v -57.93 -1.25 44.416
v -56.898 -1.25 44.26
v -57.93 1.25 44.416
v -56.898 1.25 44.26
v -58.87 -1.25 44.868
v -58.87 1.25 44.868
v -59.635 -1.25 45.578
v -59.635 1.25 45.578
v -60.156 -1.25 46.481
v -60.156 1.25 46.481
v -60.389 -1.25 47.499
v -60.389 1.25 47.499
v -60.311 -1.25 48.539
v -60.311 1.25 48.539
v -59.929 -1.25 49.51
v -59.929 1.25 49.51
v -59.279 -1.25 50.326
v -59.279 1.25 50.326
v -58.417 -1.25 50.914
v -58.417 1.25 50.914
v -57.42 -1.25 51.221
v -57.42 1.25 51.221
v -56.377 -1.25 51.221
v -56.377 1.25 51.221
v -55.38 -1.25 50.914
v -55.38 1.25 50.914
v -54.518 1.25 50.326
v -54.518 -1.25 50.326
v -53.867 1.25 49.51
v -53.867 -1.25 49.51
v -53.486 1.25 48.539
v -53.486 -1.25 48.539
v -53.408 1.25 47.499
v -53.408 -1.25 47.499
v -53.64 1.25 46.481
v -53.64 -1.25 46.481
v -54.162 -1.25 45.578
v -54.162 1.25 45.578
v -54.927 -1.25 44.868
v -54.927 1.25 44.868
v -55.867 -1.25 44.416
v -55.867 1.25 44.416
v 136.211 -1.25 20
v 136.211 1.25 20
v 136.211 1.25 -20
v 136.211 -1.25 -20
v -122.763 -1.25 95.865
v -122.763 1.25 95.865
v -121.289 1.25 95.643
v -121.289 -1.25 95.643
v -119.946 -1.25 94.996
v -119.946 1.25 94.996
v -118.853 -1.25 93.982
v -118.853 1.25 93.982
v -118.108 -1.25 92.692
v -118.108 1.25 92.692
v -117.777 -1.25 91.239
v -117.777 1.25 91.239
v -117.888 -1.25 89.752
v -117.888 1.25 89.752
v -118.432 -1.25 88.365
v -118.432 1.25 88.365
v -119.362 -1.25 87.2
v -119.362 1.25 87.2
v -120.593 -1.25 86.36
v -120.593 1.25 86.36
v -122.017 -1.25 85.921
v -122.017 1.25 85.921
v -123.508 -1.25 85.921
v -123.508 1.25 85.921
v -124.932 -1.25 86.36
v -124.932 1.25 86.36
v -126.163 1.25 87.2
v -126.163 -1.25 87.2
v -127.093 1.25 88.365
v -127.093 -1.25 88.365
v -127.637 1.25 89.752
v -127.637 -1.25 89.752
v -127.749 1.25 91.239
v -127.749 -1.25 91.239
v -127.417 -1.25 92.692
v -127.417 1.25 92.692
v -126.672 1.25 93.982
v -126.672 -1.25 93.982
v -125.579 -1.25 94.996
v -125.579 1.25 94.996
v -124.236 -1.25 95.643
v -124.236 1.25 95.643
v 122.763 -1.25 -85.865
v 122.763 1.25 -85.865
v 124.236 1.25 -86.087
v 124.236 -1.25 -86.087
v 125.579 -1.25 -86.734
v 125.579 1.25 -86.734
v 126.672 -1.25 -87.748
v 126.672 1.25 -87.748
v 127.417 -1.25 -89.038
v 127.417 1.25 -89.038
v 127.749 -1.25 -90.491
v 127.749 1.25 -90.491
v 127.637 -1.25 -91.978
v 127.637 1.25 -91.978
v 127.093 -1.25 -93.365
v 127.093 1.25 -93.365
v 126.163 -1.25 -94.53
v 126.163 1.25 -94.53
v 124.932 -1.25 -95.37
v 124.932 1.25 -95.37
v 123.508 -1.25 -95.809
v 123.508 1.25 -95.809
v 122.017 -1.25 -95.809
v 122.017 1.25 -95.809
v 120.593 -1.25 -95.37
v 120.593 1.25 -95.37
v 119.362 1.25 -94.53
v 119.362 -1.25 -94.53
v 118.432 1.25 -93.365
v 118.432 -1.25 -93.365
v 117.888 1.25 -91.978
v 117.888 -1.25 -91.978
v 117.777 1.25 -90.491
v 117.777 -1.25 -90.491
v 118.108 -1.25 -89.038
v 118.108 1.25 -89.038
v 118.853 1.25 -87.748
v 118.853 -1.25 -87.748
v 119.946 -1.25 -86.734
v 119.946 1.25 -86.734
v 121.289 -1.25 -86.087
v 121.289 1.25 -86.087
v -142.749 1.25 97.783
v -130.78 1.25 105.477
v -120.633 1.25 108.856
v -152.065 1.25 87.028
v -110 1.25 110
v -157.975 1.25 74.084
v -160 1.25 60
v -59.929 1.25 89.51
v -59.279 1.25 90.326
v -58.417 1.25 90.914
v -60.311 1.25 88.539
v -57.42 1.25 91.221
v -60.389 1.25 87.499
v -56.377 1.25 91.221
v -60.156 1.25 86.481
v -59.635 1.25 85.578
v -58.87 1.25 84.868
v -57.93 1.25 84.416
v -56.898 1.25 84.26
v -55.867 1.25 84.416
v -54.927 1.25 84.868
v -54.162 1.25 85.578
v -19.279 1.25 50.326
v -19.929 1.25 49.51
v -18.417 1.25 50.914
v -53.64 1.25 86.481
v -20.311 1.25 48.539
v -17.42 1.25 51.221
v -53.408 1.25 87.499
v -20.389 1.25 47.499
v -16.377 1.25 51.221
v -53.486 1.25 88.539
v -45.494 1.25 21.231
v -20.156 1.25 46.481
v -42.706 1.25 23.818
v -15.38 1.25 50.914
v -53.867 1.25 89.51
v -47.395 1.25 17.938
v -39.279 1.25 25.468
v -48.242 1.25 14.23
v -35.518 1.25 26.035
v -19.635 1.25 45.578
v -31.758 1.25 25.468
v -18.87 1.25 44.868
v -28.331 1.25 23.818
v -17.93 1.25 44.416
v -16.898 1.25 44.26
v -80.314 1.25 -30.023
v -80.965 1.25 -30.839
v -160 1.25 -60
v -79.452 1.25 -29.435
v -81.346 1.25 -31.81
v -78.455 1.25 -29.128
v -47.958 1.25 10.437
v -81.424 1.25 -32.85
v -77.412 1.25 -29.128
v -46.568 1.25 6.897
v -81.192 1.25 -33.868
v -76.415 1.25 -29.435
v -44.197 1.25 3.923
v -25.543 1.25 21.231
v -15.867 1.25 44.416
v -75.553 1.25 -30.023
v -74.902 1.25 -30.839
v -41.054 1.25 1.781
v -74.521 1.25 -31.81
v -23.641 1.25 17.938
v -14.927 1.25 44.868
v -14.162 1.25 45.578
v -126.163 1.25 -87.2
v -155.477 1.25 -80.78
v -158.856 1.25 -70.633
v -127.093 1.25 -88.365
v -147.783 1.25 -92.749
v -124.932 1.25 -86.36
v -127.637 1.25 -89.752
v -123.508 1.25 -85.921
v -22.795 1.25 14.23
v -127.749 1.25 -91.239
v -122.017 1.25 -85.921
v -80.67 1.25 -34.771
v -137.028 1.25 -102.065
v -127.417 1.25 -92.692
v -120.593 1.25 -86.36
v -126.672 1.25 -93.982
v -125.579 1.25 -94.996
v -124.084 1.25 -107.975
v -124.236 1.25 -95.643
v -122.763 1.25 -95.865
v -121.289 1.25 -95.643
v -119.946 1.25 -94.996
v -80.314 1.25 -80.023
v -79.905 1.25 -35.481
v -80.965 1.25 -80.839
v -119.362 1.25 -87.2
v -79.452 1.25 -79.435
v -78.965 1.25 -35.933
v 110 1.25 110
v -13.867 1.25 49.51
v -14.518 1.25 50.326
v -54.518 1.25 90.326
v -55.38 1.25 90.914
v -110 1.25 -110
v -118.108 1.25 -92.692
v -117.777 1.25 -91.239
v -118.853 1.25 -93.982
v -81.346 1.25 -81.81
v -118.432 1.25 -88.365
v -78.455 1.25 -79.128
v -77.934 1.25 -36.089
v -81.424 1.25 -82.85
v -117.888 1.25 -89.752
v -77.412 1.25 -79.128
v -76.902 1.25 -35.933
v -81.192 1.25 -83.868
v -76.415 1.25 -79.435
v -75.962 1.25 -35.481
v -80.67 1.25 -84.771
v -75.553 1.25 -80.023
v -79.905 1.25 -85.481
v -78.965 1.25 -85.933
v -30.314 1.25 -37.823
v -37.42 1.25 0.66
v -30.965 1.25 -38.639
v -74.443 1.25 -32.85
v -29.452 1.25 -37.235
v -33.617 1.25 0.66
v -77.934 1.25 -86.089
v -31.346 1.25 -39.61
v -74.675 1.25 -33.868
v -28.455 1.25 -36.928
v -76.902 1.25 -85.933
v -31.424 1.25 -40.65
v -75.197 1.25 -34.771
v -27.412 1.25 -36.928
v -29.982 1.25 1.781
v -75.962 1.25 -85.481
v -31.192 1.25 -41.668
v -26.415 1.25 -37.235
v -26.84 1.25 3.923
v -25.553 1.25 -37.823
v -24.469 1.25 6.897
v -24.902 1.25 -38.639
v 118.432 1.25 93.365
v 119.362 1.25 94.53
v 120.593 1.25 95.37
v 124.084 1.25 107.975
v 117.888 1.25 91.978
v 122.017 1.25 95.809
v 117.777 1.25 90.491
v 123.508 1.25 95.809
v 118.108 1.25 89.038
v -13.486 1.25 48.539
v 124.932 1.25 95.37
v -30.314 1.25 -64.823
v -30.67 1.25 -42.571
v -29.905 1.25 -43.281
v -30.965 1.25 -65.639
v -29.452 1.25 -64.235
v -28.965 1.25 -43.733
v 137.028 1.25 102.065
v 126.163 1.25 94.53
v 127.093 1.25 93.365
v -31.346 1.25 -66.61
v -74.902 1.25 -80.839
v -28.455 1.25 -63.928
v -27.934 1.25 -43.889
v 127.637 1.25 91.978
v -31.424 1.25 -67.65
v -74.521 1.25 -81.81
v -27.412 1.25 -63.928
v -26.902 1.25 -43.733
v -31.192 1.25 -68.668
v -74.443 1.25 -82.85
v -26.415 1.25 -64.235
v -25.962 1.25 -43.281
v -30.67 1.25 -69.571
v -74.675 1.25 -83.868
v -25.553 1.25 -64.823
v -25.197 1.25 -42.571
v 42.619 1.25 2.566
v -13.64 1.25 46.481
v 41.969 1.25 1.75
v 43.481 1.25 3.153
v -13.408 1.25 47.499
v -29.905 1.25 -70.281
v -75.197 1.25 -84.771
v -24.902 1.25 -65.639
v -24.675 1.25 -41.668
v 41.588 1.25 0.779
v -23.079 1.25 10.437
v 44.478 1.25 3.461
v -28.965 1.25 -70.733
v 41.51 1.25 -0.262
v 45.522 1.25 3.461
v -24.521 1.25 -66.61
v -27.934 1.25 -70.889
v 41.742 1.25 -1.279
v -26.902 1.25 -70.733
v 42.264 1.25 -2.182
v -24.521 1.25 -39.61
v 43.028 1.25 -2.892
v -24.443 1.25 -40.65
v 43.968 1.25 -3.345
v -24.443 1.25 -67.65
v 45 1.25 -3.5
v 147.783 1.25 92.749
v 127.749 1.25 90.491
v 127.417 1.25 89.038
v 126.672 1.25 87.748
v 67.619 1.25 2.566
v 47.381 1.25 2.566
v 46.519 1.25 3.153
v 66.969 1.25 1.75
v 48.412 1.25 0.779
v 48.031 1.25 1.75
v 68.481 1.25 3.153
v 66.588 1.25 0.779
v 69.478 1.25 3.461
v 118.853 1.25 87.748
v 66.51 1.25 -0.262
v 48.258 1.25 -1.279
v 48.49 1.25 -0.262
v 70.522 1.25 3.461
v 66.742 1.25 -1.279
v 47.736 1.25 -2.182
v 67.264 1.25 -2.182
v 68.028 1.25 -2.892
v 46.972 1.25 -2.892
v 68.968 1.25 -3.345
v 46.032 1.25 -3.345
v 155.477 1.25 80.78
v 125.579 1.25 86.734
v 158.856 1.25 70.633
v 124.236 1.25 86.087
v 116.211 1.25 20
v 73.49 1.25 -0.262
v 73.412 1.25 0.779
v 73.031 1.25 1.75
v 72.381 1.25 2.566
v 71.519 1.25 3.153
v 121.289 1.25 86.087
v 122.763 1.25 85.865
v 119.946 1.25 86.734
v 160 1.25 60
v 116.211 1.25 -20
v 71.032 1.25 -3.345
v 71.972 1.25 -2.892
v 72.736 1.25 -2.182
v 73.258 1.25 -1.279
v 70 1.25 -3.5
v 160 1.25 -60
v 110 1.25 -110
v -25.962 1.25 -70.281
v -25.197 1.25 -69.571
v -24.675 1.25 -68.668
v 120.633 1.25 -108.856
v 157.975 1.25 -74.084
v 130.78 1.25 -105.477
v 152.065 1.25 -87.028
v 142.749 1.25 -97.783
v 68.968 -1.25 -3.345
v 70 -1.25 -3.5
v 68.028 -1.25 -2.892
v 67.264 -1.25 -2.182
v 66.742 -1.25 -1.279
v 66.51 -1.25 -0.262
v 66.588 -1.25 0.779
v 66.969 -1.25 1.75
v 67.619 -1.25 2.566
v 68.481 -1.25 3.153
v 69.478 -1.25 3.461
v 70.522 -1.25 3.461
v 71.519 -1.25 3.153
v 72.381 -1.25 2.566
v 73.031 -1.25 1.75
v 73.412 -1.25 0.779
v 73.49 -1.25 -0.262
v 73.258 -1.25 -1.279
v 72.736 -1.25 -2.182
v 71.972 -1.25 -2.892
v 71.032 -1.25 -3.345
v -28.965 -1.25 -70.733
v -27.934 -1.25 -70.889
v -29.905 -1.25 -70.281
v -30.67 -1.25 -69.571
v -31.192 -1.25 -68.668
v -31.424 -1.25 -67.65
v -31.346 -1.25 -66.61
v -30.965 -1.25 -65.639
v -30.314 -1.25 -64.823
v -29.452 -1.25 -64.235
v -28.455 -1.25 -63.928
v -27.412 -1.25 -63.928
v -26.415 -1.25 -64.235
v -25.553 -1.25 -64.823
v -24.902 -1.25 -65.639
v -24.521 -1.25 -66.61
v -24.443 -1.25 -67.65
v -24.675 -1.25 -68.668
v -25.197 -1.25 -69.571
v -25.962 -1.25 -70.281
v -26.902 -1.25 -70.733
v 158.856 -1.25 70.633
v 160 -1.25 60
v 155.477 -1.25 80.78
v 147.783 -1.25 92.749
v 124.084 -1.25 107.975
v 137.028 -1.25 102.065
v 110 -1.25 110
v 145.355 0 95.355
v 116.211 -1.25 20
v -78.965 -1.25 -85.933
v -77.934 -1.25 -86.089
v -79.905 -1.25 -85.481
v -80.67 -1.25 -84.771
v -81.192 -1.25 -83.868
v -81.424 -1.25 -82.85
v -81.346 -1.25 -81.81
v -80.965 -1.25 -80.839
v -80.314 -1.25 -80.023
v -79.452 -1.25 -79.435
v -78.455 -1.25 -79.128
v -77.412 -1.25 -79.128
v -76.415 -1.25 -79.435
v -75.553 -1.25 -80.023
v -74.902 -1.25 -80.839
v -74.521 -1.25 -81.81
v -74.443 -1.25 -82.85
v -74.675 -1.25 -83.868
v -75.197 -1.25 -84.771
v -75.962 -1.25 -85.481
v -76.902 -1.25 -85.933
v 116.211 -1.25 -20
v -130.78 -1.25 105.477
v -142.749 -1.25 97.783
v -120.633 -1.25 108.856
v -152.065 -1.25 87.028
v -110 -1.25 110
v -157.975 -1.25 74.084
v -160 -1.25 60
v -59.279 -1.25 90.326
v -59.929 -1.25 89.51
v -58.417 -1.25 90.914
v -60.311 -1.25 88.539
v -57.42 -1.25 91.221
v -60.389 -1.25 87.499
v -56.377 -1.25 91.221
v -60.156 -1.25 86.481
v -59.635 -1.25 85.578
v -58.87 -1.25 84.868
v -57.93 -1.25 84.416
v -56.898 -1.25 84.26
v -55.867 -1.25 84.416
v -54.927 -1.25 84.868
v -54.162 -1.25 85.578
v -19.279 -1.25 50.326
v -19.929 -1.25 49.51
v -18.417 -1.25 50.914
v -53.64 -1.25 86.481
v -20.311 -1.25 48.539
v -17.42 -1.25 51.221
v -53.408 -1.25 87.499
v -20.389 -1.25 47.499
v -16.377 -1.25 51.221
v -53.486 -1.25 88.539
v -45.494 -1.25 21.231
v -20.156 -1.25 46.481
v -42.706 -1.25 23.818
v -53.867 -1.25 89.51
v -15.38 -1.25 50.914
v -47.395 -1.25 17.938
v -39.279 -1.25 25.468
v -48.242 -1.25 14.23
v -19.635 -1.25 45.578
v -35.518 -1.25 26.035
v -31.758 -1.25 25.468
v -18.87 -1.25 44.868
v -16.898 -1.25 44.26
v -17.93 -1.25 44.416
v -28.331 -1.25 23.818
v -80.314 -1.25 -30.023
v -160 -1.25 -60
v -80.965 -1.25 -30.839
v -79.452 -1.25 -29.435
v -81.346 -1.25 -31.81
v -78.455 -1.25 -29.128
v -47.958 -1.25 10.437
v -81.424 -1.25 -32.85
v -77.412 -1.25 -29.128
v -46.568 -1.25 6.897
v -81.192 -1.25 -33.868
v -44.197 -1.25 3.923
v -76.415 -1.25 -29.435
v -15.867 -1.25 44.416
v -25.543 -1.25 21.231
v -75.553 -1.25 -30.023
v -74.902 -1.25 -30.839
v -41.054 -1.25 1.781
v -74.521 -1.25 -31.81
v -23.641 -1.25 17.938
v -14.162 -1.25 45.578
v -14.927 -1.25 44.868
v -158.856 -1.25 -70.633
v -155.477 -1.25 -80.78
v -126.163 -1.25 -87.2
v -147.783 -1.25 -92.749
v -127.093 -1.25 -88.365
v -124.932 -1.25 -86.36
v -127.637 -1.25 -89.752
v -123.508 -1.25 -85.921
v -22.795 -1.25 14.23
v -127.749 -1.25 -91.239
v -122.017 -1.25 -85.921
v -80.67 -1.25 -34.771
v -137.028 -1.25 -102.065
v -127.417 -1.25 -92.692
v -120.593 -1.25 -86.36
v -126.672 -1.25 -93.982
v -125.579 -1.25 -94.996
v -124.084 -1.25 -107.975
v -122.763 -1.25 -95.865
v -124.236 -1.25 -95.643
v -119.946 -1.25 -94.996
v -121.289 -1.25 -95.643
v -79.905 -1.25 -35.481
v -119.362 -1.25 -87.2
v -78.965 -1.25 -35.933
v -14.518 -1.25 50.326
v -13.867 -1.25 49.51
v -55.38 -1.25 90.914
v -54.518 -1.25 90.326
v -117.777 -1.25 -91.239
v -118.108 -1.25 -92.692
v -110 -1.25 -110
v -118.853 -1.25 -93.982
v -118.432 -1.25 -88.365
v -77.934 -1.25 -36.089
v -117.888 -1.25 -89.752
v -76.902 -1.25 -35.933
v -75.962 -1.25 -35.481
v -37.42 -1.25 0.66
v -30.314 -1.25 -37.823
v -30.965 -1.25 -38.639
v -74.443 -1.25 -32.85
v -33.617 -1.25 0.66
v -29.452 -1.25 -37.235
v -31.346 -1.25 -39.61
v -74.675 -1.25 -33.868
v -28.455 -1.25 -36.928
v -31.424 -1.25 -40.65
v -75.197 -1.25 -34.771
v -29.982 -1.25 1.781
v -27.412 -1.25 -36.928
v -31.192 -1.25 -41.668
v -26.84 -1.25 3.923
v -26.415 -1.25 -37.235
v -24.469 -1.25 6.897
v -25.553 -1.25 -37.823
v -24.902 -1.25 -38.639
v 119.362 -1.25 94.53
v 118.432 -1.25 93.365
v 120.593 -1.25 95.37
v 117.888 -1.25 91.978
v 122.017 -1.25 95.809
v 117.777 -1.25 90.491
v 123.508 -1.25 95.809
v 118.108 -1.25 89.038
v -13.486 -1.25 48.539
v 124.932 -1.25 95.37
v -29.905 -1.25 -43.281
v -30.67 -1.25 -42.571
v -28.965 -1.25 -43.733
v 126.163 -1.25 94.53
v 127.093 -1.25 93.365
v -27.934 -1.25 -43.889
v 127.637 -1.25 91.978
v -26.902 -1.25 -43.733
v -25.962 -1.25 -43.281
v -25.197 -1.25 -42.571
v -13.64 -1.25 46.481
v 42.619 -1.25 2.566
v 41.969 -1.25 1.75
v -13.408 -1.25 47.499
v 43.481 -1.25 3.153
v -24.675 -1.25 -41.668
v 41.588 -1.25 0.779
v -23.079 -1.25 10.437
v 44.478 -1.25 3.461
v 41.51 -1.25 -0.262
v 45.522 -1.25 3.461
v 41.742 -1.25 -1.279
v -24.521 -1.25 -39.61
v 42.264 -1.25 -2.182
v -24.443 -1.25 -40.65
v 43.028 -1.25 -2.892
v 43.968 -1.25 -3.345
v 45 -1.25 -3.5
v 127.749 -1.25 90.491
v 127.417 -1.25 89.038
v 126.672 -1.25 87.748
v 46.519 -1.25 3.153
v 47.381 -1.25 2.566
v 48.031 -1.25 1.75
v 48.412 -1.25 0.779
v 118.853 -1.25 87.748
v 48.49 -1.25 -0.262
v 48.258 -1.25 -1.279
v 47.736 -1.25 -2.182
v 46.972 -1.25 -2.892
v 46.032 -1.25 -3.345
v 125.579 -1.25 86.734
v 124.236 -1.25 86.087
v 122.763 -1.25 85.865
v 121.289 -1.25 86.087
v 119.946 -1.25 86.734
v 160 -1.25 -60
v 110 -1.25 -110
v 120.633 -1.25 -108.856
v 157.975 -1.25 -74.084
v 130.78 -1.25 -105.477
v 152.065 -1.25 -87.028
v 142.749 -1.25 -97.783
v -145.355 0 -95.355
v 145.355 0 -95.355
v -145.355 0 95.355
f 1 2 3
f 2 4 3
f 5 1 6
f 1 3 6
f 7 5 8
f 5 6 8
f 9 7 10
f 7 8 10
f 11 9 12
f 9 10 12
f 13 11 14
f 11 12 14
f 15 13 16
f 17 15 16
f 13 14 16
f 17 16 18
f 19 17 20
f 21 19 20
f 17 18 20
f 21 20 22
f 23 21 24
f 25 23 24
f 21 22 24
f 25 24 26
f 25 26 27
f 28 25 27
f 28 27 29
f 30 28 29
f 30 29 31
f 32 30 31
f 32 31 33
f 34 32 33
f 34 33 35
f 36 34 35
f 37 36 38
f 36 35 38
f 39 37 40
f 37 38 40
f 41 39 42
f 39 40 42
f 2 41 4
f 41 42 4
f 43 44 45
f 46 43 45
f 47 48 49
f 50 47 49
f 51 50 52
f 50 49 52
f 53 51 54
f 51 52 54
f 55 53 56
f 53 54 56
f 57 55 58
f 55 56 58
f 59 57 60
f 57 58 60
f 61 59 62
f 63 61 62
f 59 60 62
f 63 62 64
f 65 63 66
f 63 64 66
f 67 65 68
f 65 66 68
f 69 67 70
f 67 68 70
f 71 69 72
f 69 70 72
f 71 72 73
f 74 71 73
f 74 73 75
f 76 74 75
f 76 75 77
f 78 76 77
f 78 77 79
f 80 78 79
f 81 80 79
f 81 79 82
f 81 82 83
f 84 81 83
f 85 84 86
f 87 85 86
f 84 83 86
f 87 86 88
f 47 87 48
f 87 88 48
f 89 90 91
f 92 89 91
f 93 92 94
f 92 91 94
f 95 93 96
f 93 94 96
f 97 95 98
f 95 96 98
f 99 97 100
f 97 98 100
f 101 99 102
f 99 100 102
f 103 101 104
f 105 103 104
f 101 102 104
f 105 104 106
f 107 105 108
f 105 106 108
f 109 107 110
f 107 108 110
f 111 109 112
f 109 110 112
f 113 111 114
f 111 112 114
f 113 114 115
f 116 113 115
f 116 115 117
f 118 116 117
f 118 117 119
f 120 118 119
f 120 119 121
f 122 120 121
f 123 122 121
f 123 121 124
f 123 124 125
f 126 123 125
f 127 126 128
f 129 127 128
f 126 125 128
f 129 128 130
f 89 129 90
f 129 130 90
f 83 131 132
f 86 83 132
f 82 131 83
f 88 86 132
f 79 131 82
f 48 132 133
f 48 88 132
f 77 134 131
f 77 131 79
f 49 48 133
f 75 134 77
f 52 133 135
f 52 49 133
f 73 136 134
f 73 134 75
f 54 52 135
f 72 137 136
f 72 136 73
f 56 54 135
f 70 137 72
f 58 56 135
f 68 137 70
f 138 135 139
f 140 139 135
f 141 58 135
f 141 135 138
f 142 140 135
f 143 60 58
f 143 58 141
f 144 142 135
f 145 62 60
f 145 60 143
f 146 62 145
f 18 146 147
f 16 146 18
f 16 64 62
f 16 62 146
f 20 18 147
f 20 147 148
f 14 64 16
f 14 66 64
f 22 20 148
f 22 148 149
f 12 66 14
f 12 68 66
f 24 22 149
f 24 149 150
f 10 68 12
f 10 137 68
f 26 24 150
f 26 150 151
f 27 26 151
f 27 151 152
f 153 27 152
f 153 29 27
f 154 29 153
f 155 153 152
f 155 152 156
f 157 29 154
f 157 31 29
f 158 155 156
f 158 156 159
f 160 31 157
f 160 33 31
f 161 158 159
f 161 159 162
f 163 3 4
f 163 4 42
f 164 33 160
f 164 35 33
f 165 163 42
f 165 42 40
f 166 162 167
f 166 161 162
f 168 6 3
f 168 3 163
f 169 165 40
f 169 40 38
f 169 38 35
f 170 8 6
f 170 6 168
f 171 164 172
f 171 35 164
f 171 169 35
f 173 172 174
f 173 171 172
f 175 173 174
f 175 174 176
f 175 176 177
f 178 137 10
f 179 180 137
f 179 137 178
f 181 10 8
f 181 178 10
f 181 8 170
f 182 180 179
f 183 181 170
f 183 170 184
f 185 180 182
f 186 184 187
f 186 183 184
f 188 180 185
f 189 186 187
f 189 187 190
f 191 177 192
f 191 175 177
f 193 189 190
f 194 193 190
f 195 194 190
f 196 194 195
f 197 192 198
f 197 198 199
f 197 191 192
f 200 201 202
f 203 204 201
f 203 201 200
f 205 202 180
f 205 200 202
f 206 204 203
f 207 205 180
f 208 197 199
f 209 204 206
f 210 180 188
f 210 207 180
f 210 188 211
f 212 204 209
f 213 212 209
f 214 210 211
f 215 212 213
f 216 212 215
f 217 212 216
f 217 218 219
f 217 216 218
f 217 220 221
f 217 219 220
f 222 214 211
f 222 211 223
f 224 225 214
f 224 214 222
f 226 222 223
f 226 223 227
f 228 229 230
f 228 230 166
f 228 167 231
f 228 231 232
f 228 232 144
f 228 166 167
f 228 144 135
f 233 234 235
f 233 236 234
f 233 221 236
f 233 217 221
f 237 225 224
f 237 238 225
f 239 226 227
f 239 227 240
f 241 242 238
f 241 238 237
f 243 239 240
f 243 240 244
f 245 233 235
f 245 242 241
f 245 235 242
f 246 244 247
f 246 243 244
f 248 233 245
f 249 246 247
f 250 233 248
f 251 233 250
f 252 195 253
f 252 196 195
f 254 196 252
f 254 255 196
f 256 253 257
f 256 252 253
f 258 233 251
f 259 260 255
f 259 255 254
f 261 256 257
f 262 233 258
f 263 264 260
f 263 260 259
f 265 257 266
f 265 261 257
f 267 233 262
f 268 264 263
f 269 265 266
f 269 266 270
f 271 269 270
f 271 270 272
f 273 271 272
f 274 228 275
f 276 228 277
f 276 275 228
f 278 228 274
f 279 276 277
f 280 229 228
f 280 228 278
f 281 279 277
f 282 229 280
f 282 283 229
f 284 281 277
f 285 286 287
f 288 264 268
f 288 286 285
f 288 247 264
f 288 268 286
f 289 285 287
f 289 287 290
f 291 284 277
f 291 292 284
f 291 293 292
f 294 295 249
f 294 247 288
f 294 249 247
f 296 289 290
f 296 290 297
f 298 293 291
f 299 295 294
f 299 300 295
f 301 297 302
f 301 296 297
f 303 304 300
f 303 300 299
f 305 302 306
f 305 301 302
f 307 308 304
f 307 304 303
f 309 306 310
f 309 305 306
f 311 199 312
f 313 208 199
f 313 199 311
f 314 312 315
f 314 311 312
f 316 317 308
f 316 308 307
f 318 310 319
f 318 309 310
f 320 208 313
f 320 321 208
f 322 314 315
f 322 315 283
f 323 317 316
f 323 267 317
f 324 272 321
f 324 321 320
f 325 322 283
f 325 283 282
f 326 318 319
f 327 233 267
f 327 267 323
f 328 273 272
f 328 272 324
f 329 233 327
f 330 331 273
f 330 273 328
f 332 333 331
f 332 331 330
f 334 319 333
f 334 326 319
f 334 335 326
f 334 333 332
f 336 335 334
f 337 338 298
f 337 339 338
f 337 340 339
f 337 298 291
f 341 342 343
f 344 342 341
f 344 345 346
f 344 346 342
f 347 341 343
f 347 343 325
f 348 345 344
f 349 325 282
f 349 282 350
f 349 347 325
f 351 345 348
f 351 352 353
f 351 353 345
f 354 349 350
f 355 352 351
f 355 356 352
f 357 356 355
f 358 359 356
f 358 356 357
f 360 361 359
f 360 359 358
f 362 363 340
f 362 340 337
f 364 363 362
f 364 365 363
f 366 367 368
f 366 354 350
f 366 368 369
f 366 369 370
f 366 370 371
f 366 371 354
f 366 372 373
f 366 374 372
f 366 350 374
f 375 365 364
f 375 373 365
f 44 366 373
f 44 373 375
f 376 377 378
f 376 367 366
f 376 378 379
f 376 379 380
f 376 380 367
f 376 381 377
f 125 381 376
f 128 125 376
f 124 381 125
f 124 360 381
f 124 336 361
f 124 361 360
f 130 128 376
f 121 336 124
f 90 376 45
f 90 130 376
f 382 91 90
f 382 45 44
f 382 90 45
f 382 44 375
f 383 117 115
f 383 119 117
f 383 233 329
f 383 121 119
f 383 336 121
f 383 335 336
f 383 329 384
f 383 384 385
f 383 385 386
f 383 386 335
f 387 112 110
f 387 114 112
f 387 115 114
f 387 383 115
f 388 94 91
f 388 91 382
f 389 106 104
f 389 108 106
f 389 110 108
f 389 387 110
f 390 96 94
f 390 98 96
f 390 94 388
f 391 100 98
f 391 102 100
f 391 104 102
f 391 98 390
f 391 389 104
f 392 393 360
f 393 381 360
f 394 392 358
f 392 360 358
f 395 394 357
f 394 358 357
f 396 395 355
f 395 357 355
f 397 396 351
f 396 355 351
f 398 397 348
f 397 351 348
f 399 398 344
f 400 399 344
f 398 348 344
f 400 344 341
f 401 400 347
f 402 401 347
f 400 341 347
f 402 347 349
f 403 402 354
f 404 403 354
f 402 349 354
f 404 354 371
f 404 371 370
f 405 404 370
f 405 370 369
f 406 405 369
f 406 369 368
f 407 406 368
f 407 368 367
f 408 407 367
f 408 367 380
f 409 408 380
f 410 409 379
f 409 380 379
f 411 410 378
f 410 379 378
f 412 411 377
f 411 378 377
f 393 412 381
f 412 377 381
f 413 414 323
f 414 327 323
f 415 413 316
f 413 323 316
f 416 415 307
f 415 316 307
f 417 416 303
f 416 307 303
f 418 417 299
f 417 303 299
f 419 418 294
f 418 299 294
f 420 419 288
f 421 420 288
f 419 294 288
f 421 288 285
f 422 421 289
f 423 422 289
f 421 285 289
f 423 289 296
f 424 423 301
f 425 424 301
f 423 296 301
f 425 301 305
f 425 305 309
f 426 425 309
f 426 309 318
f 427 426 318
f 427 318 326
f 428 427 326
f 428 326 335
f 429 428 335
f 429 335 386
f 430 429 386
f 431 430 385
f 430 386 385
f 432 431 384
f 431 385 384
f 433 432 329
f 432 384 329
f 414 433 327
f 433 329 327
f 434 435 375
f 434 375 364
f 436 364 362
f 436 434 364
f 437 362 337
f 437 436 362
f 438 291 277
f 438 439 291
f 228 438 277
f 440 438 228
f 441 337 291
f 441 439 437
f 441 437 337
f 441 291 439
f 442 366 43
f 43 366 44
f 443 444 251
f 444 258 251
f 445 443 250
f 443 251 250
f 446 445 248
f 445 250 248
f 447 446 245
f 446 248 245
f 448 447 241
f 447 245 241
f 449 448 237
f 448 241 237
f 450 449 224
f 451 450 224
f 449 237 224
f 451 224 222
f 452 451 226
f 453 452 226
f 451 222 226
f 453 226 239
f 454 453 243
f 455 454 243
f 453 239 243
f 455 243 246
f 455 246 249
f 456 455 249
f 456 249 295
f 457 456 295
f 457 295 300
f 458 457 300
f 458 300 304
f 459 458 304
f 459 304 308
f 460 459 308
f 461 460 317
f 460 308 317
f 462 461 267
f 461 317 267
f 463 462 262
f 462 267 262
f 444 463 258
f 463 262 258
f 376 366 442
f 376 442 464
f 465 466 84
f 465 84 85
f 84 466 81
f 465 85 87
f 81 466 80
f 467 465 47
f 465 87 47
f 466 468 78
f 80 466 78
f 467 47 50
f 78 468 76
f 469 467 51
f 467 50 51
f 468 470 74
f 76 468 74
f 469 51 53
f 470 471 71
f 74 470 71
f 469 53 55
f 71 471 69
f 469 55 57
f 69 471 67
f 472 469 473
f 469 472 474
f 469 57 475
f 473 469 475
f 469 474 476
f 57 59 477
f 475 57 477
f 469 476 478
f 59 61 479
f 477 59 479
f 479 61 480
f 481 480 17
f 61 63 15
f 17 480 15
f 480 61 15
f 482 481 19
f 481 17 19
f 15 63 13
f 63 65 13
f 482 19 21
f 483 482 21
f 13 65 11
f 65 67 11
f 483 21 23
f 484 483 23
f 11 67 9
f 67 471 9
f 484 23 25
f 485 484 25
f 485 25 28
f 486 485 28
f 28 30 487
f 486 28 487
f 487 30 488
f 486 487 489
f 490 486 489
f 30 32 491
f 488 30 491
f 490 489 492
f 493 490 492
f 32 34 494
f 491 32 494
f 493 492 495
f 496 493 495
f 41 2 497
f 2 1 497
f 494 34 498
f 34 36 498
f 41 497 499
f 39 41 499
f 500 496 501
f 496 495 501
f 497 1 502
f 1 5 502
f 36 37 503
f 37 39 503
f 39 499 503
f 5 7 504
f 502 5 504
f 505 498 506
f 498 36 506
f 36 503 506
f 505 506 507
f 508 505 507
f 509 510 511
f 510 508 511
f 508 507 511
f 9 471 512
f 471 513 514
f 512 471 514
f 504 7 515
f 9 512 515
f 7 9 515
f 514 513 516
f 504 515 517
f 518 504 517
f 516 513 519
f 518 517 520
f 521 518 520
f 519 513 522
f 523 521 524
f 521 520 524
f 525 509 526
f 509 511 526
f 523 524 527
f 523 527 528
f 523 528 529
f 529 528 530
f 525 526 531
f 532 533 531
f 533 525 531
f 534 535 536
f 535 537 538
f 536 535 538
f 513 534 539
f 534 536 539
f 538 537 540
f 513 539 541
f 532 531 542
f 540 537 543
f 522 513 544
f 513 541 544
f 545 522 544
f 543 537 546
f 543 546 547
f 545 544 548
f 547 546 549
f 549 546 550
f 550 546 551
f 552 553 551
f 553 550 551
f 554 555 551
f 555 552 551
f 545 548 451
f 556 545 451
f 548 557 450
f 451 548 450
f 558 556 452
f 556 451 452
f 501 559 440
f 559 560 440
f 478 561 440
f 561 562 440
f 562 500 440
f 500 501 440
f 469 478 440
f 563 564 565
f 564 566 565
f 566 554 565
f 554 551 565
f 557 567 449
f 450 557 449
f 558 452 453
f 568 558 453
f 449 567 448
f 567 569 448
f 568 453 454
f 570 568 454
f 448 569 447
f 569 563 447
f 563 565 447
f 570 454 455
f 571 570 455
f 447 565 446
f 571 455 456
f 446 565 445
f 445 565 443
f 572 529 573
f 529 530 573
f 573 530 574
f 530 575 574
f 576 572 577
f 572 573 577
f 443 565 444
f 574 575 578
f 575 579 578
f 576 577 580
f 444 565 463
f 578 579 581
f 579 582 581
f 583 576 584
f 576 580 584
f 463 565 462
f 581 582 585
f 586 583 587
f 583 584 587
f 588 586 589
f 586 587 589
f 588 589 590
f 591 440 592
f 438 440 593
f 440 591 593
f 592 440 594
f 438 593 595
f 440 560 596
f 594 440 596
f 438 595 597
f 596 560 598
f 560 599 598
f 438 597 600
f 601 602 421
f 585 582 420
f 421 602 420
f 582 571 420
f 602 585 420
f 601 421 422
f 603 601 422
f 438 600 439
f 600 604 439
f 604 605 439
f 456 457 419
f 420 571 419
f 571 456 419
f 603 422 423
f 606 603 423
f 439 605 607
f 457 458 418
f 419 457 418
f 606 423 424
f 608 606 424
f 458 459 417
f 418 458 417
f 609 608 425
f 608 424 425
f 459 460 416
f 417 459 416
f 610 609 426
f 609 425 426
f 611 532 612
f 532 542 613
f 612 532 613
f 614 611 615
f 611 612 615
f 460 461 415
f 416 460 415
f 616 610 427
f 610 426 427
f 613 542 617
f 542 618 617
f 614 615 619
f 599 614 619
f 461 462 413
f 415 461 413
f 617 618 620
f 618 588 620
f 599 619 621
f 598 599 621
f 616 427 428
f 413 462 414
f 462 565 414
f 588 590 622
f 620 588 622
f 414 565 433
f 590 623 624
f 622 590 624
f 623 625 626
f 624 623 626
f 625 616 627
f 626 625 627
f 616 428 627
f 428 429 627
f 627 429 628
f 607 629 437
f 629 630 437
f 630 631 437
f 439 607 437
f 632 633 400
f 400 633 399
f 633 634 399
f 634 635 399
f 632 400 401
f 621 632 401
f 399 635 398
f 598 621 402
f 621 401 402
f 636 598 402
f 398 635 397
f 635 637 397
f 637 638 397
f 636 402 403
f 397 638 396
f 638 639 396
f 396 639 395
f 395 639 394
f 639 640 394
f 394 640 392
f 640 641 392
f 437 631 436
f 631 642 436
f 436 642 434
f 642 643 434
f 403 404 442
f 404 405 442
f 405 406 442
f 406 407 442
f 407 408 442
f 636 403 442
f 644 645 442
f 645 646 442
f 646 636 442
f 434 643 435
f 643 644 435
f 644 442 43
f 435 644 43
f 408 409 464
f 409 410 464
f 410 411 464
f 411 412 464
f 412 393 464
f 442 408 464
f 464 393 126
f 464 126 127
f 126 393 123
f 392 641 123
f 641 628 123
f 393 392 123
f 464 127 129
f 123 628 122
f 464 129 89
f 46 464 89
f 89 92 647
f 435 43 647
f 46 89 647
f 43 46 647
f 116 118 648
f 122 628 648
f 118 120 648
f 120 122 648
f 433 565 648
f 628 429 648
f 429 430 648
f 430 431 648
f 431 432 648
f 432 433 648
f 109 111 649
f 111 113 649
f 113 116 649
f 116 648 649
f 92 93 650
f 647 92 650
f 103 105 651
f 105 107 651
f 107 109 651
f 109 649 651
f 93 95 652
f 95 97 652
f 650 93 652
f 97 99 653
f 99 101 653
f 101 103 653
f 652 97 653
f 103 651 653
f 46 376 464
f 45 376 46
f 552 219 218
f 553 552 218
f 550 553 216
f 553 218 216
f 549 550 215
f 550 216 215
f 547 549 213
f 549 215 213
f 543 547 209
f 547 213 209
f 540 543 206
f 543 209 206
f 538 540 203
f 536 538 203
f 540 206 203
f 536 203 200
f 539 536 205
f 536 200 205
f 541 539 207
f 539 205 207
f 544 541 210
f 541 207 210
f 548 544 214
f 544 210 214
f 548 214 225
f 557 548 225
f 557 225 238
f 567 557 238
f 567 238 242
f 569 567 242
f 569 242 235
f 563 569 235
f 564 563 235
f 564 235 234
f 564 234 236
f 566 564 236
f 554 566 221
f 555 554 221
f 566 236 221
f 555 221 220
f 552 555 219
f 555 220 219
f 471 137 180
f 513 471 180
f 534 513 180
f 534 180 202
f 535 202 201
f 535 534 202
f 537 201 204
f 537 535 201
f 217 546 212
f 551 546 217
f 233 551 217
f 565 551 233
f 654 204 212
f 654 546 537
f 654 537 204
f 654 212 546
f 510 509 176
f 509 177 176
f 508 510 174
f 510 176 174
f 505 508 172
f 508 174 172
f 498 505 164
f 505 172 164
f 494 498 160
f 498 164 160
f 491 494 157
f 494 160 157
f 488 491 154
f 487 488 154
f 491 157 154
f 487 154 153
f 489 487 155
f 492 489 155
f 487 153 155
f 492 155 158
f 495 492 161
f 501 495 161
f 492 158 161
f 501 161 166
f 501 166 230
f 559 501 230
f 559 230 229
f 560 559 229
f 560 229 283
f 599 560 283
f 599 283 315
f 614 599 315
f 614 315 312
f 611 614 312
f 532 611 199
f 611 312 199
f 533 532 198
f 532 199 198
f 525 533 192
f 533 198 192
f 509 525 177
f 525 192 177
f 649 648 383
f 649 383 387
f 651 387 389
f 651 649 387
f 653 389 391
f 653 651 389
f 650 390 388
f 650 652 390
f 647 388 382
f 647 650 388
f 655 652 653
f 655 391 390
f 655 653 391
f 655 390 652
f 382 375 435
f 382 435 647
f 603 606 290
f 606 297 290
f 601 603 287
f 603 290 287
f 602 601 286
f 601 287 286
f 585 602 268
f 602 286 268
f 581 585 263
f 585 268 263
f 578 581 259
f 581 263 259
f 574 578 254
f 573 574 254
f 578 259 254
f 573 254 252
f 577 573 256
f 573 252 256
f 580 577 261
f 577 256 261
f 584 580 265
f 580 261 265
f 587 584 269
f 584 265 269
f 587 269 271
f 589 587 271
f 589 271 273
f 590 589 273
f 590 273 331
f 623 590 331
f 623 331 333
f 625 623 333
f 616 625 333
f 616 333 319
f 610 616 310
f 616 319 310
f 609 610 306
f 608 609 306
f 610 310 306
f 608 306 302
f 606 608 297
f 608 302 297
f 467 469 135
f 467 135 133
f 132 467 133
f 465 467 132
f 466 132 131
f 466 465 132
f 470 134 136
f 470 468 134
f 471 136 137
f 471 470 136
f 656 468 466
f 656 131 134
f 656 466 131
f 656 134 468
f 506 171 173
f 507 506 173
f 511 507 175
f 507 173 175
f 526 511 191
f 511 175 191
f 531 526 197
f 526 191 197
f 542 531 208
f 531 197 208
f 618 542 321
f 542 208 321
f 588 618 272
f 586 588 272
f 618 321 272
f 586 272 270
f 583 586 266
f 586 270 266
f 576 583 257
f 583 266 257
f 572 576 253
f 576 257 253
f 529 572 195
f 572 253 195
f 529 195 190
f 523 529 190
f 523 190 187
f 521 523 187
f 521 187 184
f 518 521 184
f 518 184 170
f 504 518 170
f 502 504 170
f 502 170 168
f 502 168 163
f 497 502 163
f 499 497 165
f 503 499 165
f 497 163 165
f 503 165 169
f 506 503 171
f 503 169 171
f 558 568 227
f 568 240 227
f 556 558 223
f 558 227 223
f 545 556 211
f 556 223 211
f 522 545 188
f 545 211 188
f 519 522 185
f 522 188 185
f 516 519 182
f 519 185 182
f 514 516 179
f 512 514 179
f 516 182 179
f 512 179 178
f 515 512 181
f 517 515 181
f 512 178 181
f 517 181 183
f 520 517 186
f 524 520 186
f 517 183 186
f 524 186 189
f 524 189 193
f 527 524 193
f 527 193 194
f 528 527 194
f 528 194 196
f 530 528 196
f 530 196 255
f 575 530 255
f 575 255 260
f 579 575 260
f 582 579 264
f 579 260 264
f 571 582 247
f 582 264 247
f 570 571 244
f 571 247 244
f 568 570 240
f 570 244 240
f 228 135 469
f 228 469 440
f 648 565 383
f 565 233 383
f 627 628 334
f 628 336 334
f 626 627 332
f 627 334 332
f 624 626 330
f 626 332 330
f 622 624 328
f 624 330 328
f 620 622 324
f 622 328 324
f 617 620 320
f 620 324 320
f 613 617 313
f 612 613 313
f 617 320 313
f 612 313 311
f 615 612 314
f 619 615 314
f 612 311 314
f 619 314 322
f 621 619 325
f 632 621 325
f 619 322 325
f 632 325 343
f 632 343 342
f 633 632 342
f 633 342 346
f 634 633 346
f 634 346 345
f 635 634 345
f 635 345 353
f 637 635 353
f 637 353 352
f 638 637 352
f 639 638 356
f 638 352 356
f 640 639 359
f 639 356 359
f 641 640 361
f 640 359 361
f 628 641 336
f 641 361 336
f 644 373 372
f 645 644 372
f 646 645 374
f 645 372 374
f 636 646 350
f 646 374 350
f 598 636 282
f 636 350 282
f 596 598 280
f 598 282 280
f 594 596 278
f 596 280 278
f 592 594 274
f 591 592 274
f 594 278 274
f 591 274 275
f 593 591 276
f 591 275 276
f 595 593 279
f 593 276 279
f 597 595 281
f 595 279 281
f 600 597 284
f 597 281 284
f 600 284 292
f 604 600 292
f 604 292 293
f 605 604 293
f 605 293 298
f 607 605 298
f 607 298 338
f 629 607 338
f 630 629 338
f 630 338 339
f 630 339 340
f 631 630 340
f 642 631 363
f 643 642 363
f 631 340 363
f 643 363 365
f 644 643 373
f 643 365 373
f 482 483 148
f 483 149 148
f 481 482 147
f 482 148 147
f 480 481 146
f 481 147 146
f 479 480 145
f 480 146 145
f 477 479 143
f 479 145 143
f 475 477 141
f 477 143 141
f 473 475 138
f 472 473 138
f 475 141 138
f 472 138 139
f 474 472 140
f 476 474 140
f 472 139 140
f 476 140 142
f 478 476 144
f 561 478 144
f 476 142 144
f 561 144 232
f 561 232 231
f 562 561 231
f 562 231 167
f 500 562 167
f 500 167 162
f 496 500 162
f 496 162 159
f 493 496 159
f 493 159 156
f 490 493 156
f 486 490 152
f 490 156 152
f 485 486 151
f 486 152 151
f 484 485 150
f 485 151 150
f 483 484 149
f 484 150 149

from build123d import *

# Parameters (mm, degrees)
SKETCH1_W                       = 320
SKETCH1_H                       = 220
THE_UPPER_CHASISS_DEPTH         = 1.25
BATTARY_REACH                   = 196.169
SKETCH2_R                       = 3.5
BATTARY_DIRECTION_2_REACH       = 196.169
POWER_SECTION_REACH             = 196.169
SKETCH3_R                       = 3.5
POWER_SECTION_DIRECTION_2_REACH = 196.169
ARDUINO_R                       = 3.5
ARDUINO_SECTION_DEPTH           = 2.5
SKETCH7_R                       = 5
LINK_NAILS_DEPTH                = 2.5
SKETCH9_W                       = 20
SKETCH9_H                       = 40
RECT_CUT_DEPTH                  = 2.5
SKETCH10_R                      = 12.759028862
CIRC_CUT_DEPTH                  = 2.5
FILLET4_R                       = 50


with BuildPart() as part:
    # Sketch1 → the upper chasiss (new, symmetric)
    with BuildSketch(Plane(origin=(0, 0, 0), x_dir=(1, 0, 0), z_dir=(0, 1, 0))):
        Rectangle(SKETCH1_W, SKETCH1_H)
    extrude(amount=THE_UPPER_CHASISS_DEPTH, both=True)

    # Battary: up to this face of the body (flat: up to its plane)
    battary_end = Plane(part.part.faces().sort_by_distance((0, 1.25, 0))[0])
    # Sketch2 → Battary (cut, up to the picked face)
    with BuildSketch(Plane(origin=(0, 0, 0), x_dir=(1, 0, 0), z_dir=(0, 1, 0)), mode=Mode.PRIVATE) as battary_sk1:
        with Locations((70, 0)):
            Circle(SKETCH2_R)
    battary_tool1 = split(extrude(battary_sk1.sketch, amount=BATTARY_REACH, mode=Mode.PRIVATE), bisect_by=battary_end, keep=Keep.BOTH, mode=Mode.PRIVATE)
    # Sketch2 → Battary (cut, up to the picked face)
    with BuildSketch(Plane(origin=(0, 0, 0), x_dir=(1, 0, 0), z_dir=(0, 1, 0)), mode=Mode.PRIVATE) as battary_sk2:
        with Locations((45, 0)):
            Circle(SKETCH2_R)
    battary_tool2 = split(extrude(battary_sk2.sketch, amount=BATTARY_REACH, mode=Mode.PRIVATE), bisect_by=battary_end, keep=Keep.BOTH, mode=Mode.PRIVATE)
    add(battary_tool1.solids().sort_by(Axis((70, 0, 0), (0, 1, 0)))[0], mode=Mode.SUBTRACT)
    add(battary_tool2.solids().sort_by(Axis((45, 0, 0), (0, 1, 0)))[0], mode=Mode.SUBTRACT)

    # Battary direction 2: up to this face of the body (flat: up to its plane)
    battary_direction_2_end = Plane(part.part.faces().sort_by_distance((0, -1.25, 0))[0])
    # Sketch2 → Battary direction 2 (cut, up to the picked face)
    with BuildSketch(Plane(origin=(0, 0, 0), x_dir=(1, 0, 0), z_dir=(0, 1, 0)), mode=Mode.PRIVATE) as battary_direction_2_sk1:
        with Locations((70, 0)):
            Circle(SKETCH2_R)
    battary_direction_2_tool1 = split(extrude(battary_direction_2_sk1.sketch, amount=-BATTARY_DIRECTION_2_REACH, mode=Mode.PRIVATE), bisect_by=battary_direction_2_end, keep=Keep.BOTH, mode=Mode.PRIVATE)
    # Sketch2 → Battary direction 2 (cut, up to the picked face)
    with BuildSketch(Plane(origin=(0, 0, 0), x_dir=(1, 0, 0), z_dir=(0, 1, 0)), mode=Mode.PRIVATE) as battary_direction_2_sk2:
        with Locations((45, 0)):
            Circle(SKETCH2_R)
    battary_direction_2_tool2 = split(extrude(battary_direction_2_sk2.sketch, amount=-BATTARY_DIRECTION_2_REACH, mode=Mode.PRIVATE), bisect_by=battary_direction_2_end, keep=Keep.BOTH, mode=Mode.PRIVATE)
    add(battary_direction_2_tool1.solids().sort_by(Axis((70, 0, 0), (0, -1, 0)))[0], mode=Mode.SUBTRACT)
    add(battary_direction_2_tool2.solids().sort_by(Axis((45, 0, 0), (0, -1, 0)))[0], mode=Mode.SUBTRACT)

    # power section: up to this face of the body (flat: up to its plane)
    power_section_end = Plane(part.part.faces().sort_by_distance((-0.062934128, -1.25, 0))[0])
    # Sketch3 → power section (cut, up to the picked face)
    with BuildSketch(Plane(origin=(0, 0, 0), x_dir=(1, 0, 0), z_dir=(0, 1, 0)), mode=Mode.PRIVATE) as power_section_sk1:
        with Locations((-56.898371951, -47.760148577)):
            Circle(SKETCH3_R)
    power_section_tool1 = split(extrude(power_section_sk1.sketch, amount=-POWER_SECTION_REACH, mode=Mode.PRIVATE), bisect_by=power_section_end, keep=Keep.BOTH, mode=Mode.PRIVATE)
    # Sketch3 → power section (cut, up to the picked face)
    with BuildSketch(Plane(origin=(0, 0, 0), x_dir=(1, 0, 0), z_dir=(0, 1, 0)), mode=Mode.PRIVATE) as power_section_sk2:
        with Locations((-16.898371951, -47.760148577)):
            Circle(SKETCH3_R)
    power_section_tool2 = split(extrude(power_section_sk2.sketch, amount=-POWER_SECTION_REACH, mode=Mode.PRIVATE), bisect_by=power_section_end, keep=Keep.BOTH, mode=Mode.PRIVATE)
    # Sketch3 → power section (cut, up to the picked face)
    with BuildSketch(Plane(origin=(0, 0, 0), x_dir=(1, 0, 0), z_dir=(0, 1, 0)), mode=Mode.PRIVATE) as power_section_sk3:
        with Locations((-56.898371951, -87.760148577)):
            Circle(SKETCH3_R)
    power_section_tool3 = split(extrude(power_section_sk3.sketch, amount=-POWER_SECTION_REACH, mode=Mode.PRIVATE), bisect_by=power_section_end, keep=Keep.BOTH, mode=Mode.PRIVATE)
    add(power_section_tool1.solids().sort_by(Axis((-56.898372, 0, 47.760149), (0, -1, 0)))[0], mode=Mode.SUBTRACT)
    add(power_section_tool2.solids().sort_by(Axis((-16.898372, 0, 47.760149), (0, -1, 0)))[0], mode=Mode.SUBTRACT)
    add(power_section_tool3.solids().sort_by(Axis((-56.898372, 0, 87.760149), (0, -1, 0)))[0], mode=Mode.SUBTRACT)

    # power section direction 2: up to this face of the body (flat: up to its plane)
    power_section_direction_2_end = Plane(part.part.faces().sort_by_distance((-0.062934128, 1.25, 0))[0])
    # Sketch3 → power section direction 2 (cut, up to the picked face)
    with BuildSketch(Plane(origin=(0, 0, 0), x_dir=(1, 0, 0), z_dir=(0, 1, 0)), mode=Mode.PRIVATE) as power_section_direction_2_sk1:
        with Locations((-56.898371951, -47.760148577)):
            Circle(SKETCH3_R)
    power_section_direction_2_tool1 = split(extrude(power_section_direction_2_sk1.sketch, amount=POWER_SECTION_DIRECTION_2_REACH, mode=Mode.PRIVATE), bisect_by=power_section_direction_2_end, keep=Keep.BOTH, mode=Mode.PRIVATE)
    # Sketch3 → power section direction 2 (cut, up to the picked face)
    with BuildSketch(Plane(origin=(0, 0, 0), x_dir=(1, 0, 0), z_dir=(0, 1, 0)), mode=Mode.PRIVATE) as power_section_direction_2_sk2:
        with Locations((-16.898371951, -47.760148577)):
            Circle(SKETCH3_R)
    power_section_direction_2_tool2 = split(extrude(power_section_direction_2_sk2.sketch, amount=POWER_SECTION_DIRECTION_2_REACH, mode=Mode.PRIVATE), bisect_by=power_section_direction_2_end, keep=Keep.BOTH, mode=Mode.PRIVATE)
    # Sketch3 → power section direction 2 (cut, up to the picked face)
    with BuildSketch(Plane(origin=(0, 0, 0), x_dir=(1, 0, 0), z_dir=(0, 1, 0)), mode=Mode.PRIVATE) as power_section_direction_2_sk3:
        with Locations((-56.898371951, -87.760148577)):
            Circle(SKETCH3_R)
    power_section_direction_2_tool3 = split(extrude(power_section_direction_2_sk3.sketch, amount=POWER_SECTION_DIRECTION_2_REACH, mode=Mode.PRIVATE), bisect_by=power_section_direction_2_end, keep=Keep.BOTH, mode=Mode.PRIVATE)
    add(power_section_direction_2_tool1.solids().sort_by(Axis((-56.898372, 0, 47.760149), (0, 1, 0)))[0], mode=Mode.SUBTRACT)
    add(power_section_direction_2_tool2.solids().sort_by(Axis((-16.898372, 0, 47.760149), (0, 1, 0)))[0], mode=Mode.SUBTRACT)
    add(power_section_direction_2_tool3.solids().sort_by(Axis((-56.898372, 0, 87.760149), (0, 1, 0)))[0], mode=Mode.SUBTRACT)

    # arduino → arduino section (cut, symmetric)
    with BuildSketch(Plane(origin=(0, 0, 0), x_dir=(1, 0, 0), z_dir=(0, 1, 0))):
        with Locations((-77.933527642, 82.588848983)):
            Circle(ARDUINO_R)
        with Locations((-77.933527642, 32.588848983)):
            Circle(ARDUINO_R)
        with Locations((-27.933527642, 67.388848983)):
            Circle(ARDUINO_R)
        with Locations((-27.933527642, 40.388848983)):
            Circle(ARDUINO_R)
    extrude(amount=ARDUINO_SECTION_DEPTH, both=True, mode=Mode.SUBTRACT)

    # Sketch7 → link nails (cut, symmetric)
    with BuildSketch(Plane(origin=(0, 1.25, 0), x_dir=(1, 0, 0), z_dir=(0, 1, 0))):
        with Locations((-122.762547967, -90.864975812)):
            Circle(SKETCH7_R)
        with Locations((-122.762547967, 90.864975812)):
            Circle(SKETCH7_R)
        with Locations((122.762547967, -90.864975812)):
            Circle(SKETCH7_R)
        with Locations((122.762547967, 90.864975812)):
            Circle(SKETCH7_R)
    extrude(amount=LINK_NAILS_DEPTH, both=True, mode=Mode.SUBTRACT)

    # Sketch9 → rect cut (cut, symmetric)
    with BuildSketch(Plane(origin=(0, 1.25, 0), x_dir=(1, 0, 0), z_dir=(0, 1, 0))):
        with Locations((126.210934146, 0)):
            Rectangle(SKETCH9_W, SKETCH9_H)
    extrude(amount=RECT_CUT_DEPTH, both=True, mode=Mode.SUBTRACT)

    # Sketch10 → circ cut (cut, symmetric)
    with BuildSketch(Plane(origin=(0, 1.25, 0), x_dir=(1, 0, 0), z_dir=(0, 1, 0))):
        with Locations((-35.518377642, -13.276286789)):
            Circle(SKETCH10_R)
    extrude(amount=CIRC_CUT_DEPTH, both=True, mode=Mode.SUBTRACT)

    # Fillet4
    fillet4_edges = [part.edges().sort_by_distance(p)[0] for p in [
        (-160, 0, 110),
        (160, 0, 110),
        (160, 0, -110),
        (-160, 0, -110),
    ]]
    fillet(fillet4_edges, radius=FILLET4_R)


solid = part.part
